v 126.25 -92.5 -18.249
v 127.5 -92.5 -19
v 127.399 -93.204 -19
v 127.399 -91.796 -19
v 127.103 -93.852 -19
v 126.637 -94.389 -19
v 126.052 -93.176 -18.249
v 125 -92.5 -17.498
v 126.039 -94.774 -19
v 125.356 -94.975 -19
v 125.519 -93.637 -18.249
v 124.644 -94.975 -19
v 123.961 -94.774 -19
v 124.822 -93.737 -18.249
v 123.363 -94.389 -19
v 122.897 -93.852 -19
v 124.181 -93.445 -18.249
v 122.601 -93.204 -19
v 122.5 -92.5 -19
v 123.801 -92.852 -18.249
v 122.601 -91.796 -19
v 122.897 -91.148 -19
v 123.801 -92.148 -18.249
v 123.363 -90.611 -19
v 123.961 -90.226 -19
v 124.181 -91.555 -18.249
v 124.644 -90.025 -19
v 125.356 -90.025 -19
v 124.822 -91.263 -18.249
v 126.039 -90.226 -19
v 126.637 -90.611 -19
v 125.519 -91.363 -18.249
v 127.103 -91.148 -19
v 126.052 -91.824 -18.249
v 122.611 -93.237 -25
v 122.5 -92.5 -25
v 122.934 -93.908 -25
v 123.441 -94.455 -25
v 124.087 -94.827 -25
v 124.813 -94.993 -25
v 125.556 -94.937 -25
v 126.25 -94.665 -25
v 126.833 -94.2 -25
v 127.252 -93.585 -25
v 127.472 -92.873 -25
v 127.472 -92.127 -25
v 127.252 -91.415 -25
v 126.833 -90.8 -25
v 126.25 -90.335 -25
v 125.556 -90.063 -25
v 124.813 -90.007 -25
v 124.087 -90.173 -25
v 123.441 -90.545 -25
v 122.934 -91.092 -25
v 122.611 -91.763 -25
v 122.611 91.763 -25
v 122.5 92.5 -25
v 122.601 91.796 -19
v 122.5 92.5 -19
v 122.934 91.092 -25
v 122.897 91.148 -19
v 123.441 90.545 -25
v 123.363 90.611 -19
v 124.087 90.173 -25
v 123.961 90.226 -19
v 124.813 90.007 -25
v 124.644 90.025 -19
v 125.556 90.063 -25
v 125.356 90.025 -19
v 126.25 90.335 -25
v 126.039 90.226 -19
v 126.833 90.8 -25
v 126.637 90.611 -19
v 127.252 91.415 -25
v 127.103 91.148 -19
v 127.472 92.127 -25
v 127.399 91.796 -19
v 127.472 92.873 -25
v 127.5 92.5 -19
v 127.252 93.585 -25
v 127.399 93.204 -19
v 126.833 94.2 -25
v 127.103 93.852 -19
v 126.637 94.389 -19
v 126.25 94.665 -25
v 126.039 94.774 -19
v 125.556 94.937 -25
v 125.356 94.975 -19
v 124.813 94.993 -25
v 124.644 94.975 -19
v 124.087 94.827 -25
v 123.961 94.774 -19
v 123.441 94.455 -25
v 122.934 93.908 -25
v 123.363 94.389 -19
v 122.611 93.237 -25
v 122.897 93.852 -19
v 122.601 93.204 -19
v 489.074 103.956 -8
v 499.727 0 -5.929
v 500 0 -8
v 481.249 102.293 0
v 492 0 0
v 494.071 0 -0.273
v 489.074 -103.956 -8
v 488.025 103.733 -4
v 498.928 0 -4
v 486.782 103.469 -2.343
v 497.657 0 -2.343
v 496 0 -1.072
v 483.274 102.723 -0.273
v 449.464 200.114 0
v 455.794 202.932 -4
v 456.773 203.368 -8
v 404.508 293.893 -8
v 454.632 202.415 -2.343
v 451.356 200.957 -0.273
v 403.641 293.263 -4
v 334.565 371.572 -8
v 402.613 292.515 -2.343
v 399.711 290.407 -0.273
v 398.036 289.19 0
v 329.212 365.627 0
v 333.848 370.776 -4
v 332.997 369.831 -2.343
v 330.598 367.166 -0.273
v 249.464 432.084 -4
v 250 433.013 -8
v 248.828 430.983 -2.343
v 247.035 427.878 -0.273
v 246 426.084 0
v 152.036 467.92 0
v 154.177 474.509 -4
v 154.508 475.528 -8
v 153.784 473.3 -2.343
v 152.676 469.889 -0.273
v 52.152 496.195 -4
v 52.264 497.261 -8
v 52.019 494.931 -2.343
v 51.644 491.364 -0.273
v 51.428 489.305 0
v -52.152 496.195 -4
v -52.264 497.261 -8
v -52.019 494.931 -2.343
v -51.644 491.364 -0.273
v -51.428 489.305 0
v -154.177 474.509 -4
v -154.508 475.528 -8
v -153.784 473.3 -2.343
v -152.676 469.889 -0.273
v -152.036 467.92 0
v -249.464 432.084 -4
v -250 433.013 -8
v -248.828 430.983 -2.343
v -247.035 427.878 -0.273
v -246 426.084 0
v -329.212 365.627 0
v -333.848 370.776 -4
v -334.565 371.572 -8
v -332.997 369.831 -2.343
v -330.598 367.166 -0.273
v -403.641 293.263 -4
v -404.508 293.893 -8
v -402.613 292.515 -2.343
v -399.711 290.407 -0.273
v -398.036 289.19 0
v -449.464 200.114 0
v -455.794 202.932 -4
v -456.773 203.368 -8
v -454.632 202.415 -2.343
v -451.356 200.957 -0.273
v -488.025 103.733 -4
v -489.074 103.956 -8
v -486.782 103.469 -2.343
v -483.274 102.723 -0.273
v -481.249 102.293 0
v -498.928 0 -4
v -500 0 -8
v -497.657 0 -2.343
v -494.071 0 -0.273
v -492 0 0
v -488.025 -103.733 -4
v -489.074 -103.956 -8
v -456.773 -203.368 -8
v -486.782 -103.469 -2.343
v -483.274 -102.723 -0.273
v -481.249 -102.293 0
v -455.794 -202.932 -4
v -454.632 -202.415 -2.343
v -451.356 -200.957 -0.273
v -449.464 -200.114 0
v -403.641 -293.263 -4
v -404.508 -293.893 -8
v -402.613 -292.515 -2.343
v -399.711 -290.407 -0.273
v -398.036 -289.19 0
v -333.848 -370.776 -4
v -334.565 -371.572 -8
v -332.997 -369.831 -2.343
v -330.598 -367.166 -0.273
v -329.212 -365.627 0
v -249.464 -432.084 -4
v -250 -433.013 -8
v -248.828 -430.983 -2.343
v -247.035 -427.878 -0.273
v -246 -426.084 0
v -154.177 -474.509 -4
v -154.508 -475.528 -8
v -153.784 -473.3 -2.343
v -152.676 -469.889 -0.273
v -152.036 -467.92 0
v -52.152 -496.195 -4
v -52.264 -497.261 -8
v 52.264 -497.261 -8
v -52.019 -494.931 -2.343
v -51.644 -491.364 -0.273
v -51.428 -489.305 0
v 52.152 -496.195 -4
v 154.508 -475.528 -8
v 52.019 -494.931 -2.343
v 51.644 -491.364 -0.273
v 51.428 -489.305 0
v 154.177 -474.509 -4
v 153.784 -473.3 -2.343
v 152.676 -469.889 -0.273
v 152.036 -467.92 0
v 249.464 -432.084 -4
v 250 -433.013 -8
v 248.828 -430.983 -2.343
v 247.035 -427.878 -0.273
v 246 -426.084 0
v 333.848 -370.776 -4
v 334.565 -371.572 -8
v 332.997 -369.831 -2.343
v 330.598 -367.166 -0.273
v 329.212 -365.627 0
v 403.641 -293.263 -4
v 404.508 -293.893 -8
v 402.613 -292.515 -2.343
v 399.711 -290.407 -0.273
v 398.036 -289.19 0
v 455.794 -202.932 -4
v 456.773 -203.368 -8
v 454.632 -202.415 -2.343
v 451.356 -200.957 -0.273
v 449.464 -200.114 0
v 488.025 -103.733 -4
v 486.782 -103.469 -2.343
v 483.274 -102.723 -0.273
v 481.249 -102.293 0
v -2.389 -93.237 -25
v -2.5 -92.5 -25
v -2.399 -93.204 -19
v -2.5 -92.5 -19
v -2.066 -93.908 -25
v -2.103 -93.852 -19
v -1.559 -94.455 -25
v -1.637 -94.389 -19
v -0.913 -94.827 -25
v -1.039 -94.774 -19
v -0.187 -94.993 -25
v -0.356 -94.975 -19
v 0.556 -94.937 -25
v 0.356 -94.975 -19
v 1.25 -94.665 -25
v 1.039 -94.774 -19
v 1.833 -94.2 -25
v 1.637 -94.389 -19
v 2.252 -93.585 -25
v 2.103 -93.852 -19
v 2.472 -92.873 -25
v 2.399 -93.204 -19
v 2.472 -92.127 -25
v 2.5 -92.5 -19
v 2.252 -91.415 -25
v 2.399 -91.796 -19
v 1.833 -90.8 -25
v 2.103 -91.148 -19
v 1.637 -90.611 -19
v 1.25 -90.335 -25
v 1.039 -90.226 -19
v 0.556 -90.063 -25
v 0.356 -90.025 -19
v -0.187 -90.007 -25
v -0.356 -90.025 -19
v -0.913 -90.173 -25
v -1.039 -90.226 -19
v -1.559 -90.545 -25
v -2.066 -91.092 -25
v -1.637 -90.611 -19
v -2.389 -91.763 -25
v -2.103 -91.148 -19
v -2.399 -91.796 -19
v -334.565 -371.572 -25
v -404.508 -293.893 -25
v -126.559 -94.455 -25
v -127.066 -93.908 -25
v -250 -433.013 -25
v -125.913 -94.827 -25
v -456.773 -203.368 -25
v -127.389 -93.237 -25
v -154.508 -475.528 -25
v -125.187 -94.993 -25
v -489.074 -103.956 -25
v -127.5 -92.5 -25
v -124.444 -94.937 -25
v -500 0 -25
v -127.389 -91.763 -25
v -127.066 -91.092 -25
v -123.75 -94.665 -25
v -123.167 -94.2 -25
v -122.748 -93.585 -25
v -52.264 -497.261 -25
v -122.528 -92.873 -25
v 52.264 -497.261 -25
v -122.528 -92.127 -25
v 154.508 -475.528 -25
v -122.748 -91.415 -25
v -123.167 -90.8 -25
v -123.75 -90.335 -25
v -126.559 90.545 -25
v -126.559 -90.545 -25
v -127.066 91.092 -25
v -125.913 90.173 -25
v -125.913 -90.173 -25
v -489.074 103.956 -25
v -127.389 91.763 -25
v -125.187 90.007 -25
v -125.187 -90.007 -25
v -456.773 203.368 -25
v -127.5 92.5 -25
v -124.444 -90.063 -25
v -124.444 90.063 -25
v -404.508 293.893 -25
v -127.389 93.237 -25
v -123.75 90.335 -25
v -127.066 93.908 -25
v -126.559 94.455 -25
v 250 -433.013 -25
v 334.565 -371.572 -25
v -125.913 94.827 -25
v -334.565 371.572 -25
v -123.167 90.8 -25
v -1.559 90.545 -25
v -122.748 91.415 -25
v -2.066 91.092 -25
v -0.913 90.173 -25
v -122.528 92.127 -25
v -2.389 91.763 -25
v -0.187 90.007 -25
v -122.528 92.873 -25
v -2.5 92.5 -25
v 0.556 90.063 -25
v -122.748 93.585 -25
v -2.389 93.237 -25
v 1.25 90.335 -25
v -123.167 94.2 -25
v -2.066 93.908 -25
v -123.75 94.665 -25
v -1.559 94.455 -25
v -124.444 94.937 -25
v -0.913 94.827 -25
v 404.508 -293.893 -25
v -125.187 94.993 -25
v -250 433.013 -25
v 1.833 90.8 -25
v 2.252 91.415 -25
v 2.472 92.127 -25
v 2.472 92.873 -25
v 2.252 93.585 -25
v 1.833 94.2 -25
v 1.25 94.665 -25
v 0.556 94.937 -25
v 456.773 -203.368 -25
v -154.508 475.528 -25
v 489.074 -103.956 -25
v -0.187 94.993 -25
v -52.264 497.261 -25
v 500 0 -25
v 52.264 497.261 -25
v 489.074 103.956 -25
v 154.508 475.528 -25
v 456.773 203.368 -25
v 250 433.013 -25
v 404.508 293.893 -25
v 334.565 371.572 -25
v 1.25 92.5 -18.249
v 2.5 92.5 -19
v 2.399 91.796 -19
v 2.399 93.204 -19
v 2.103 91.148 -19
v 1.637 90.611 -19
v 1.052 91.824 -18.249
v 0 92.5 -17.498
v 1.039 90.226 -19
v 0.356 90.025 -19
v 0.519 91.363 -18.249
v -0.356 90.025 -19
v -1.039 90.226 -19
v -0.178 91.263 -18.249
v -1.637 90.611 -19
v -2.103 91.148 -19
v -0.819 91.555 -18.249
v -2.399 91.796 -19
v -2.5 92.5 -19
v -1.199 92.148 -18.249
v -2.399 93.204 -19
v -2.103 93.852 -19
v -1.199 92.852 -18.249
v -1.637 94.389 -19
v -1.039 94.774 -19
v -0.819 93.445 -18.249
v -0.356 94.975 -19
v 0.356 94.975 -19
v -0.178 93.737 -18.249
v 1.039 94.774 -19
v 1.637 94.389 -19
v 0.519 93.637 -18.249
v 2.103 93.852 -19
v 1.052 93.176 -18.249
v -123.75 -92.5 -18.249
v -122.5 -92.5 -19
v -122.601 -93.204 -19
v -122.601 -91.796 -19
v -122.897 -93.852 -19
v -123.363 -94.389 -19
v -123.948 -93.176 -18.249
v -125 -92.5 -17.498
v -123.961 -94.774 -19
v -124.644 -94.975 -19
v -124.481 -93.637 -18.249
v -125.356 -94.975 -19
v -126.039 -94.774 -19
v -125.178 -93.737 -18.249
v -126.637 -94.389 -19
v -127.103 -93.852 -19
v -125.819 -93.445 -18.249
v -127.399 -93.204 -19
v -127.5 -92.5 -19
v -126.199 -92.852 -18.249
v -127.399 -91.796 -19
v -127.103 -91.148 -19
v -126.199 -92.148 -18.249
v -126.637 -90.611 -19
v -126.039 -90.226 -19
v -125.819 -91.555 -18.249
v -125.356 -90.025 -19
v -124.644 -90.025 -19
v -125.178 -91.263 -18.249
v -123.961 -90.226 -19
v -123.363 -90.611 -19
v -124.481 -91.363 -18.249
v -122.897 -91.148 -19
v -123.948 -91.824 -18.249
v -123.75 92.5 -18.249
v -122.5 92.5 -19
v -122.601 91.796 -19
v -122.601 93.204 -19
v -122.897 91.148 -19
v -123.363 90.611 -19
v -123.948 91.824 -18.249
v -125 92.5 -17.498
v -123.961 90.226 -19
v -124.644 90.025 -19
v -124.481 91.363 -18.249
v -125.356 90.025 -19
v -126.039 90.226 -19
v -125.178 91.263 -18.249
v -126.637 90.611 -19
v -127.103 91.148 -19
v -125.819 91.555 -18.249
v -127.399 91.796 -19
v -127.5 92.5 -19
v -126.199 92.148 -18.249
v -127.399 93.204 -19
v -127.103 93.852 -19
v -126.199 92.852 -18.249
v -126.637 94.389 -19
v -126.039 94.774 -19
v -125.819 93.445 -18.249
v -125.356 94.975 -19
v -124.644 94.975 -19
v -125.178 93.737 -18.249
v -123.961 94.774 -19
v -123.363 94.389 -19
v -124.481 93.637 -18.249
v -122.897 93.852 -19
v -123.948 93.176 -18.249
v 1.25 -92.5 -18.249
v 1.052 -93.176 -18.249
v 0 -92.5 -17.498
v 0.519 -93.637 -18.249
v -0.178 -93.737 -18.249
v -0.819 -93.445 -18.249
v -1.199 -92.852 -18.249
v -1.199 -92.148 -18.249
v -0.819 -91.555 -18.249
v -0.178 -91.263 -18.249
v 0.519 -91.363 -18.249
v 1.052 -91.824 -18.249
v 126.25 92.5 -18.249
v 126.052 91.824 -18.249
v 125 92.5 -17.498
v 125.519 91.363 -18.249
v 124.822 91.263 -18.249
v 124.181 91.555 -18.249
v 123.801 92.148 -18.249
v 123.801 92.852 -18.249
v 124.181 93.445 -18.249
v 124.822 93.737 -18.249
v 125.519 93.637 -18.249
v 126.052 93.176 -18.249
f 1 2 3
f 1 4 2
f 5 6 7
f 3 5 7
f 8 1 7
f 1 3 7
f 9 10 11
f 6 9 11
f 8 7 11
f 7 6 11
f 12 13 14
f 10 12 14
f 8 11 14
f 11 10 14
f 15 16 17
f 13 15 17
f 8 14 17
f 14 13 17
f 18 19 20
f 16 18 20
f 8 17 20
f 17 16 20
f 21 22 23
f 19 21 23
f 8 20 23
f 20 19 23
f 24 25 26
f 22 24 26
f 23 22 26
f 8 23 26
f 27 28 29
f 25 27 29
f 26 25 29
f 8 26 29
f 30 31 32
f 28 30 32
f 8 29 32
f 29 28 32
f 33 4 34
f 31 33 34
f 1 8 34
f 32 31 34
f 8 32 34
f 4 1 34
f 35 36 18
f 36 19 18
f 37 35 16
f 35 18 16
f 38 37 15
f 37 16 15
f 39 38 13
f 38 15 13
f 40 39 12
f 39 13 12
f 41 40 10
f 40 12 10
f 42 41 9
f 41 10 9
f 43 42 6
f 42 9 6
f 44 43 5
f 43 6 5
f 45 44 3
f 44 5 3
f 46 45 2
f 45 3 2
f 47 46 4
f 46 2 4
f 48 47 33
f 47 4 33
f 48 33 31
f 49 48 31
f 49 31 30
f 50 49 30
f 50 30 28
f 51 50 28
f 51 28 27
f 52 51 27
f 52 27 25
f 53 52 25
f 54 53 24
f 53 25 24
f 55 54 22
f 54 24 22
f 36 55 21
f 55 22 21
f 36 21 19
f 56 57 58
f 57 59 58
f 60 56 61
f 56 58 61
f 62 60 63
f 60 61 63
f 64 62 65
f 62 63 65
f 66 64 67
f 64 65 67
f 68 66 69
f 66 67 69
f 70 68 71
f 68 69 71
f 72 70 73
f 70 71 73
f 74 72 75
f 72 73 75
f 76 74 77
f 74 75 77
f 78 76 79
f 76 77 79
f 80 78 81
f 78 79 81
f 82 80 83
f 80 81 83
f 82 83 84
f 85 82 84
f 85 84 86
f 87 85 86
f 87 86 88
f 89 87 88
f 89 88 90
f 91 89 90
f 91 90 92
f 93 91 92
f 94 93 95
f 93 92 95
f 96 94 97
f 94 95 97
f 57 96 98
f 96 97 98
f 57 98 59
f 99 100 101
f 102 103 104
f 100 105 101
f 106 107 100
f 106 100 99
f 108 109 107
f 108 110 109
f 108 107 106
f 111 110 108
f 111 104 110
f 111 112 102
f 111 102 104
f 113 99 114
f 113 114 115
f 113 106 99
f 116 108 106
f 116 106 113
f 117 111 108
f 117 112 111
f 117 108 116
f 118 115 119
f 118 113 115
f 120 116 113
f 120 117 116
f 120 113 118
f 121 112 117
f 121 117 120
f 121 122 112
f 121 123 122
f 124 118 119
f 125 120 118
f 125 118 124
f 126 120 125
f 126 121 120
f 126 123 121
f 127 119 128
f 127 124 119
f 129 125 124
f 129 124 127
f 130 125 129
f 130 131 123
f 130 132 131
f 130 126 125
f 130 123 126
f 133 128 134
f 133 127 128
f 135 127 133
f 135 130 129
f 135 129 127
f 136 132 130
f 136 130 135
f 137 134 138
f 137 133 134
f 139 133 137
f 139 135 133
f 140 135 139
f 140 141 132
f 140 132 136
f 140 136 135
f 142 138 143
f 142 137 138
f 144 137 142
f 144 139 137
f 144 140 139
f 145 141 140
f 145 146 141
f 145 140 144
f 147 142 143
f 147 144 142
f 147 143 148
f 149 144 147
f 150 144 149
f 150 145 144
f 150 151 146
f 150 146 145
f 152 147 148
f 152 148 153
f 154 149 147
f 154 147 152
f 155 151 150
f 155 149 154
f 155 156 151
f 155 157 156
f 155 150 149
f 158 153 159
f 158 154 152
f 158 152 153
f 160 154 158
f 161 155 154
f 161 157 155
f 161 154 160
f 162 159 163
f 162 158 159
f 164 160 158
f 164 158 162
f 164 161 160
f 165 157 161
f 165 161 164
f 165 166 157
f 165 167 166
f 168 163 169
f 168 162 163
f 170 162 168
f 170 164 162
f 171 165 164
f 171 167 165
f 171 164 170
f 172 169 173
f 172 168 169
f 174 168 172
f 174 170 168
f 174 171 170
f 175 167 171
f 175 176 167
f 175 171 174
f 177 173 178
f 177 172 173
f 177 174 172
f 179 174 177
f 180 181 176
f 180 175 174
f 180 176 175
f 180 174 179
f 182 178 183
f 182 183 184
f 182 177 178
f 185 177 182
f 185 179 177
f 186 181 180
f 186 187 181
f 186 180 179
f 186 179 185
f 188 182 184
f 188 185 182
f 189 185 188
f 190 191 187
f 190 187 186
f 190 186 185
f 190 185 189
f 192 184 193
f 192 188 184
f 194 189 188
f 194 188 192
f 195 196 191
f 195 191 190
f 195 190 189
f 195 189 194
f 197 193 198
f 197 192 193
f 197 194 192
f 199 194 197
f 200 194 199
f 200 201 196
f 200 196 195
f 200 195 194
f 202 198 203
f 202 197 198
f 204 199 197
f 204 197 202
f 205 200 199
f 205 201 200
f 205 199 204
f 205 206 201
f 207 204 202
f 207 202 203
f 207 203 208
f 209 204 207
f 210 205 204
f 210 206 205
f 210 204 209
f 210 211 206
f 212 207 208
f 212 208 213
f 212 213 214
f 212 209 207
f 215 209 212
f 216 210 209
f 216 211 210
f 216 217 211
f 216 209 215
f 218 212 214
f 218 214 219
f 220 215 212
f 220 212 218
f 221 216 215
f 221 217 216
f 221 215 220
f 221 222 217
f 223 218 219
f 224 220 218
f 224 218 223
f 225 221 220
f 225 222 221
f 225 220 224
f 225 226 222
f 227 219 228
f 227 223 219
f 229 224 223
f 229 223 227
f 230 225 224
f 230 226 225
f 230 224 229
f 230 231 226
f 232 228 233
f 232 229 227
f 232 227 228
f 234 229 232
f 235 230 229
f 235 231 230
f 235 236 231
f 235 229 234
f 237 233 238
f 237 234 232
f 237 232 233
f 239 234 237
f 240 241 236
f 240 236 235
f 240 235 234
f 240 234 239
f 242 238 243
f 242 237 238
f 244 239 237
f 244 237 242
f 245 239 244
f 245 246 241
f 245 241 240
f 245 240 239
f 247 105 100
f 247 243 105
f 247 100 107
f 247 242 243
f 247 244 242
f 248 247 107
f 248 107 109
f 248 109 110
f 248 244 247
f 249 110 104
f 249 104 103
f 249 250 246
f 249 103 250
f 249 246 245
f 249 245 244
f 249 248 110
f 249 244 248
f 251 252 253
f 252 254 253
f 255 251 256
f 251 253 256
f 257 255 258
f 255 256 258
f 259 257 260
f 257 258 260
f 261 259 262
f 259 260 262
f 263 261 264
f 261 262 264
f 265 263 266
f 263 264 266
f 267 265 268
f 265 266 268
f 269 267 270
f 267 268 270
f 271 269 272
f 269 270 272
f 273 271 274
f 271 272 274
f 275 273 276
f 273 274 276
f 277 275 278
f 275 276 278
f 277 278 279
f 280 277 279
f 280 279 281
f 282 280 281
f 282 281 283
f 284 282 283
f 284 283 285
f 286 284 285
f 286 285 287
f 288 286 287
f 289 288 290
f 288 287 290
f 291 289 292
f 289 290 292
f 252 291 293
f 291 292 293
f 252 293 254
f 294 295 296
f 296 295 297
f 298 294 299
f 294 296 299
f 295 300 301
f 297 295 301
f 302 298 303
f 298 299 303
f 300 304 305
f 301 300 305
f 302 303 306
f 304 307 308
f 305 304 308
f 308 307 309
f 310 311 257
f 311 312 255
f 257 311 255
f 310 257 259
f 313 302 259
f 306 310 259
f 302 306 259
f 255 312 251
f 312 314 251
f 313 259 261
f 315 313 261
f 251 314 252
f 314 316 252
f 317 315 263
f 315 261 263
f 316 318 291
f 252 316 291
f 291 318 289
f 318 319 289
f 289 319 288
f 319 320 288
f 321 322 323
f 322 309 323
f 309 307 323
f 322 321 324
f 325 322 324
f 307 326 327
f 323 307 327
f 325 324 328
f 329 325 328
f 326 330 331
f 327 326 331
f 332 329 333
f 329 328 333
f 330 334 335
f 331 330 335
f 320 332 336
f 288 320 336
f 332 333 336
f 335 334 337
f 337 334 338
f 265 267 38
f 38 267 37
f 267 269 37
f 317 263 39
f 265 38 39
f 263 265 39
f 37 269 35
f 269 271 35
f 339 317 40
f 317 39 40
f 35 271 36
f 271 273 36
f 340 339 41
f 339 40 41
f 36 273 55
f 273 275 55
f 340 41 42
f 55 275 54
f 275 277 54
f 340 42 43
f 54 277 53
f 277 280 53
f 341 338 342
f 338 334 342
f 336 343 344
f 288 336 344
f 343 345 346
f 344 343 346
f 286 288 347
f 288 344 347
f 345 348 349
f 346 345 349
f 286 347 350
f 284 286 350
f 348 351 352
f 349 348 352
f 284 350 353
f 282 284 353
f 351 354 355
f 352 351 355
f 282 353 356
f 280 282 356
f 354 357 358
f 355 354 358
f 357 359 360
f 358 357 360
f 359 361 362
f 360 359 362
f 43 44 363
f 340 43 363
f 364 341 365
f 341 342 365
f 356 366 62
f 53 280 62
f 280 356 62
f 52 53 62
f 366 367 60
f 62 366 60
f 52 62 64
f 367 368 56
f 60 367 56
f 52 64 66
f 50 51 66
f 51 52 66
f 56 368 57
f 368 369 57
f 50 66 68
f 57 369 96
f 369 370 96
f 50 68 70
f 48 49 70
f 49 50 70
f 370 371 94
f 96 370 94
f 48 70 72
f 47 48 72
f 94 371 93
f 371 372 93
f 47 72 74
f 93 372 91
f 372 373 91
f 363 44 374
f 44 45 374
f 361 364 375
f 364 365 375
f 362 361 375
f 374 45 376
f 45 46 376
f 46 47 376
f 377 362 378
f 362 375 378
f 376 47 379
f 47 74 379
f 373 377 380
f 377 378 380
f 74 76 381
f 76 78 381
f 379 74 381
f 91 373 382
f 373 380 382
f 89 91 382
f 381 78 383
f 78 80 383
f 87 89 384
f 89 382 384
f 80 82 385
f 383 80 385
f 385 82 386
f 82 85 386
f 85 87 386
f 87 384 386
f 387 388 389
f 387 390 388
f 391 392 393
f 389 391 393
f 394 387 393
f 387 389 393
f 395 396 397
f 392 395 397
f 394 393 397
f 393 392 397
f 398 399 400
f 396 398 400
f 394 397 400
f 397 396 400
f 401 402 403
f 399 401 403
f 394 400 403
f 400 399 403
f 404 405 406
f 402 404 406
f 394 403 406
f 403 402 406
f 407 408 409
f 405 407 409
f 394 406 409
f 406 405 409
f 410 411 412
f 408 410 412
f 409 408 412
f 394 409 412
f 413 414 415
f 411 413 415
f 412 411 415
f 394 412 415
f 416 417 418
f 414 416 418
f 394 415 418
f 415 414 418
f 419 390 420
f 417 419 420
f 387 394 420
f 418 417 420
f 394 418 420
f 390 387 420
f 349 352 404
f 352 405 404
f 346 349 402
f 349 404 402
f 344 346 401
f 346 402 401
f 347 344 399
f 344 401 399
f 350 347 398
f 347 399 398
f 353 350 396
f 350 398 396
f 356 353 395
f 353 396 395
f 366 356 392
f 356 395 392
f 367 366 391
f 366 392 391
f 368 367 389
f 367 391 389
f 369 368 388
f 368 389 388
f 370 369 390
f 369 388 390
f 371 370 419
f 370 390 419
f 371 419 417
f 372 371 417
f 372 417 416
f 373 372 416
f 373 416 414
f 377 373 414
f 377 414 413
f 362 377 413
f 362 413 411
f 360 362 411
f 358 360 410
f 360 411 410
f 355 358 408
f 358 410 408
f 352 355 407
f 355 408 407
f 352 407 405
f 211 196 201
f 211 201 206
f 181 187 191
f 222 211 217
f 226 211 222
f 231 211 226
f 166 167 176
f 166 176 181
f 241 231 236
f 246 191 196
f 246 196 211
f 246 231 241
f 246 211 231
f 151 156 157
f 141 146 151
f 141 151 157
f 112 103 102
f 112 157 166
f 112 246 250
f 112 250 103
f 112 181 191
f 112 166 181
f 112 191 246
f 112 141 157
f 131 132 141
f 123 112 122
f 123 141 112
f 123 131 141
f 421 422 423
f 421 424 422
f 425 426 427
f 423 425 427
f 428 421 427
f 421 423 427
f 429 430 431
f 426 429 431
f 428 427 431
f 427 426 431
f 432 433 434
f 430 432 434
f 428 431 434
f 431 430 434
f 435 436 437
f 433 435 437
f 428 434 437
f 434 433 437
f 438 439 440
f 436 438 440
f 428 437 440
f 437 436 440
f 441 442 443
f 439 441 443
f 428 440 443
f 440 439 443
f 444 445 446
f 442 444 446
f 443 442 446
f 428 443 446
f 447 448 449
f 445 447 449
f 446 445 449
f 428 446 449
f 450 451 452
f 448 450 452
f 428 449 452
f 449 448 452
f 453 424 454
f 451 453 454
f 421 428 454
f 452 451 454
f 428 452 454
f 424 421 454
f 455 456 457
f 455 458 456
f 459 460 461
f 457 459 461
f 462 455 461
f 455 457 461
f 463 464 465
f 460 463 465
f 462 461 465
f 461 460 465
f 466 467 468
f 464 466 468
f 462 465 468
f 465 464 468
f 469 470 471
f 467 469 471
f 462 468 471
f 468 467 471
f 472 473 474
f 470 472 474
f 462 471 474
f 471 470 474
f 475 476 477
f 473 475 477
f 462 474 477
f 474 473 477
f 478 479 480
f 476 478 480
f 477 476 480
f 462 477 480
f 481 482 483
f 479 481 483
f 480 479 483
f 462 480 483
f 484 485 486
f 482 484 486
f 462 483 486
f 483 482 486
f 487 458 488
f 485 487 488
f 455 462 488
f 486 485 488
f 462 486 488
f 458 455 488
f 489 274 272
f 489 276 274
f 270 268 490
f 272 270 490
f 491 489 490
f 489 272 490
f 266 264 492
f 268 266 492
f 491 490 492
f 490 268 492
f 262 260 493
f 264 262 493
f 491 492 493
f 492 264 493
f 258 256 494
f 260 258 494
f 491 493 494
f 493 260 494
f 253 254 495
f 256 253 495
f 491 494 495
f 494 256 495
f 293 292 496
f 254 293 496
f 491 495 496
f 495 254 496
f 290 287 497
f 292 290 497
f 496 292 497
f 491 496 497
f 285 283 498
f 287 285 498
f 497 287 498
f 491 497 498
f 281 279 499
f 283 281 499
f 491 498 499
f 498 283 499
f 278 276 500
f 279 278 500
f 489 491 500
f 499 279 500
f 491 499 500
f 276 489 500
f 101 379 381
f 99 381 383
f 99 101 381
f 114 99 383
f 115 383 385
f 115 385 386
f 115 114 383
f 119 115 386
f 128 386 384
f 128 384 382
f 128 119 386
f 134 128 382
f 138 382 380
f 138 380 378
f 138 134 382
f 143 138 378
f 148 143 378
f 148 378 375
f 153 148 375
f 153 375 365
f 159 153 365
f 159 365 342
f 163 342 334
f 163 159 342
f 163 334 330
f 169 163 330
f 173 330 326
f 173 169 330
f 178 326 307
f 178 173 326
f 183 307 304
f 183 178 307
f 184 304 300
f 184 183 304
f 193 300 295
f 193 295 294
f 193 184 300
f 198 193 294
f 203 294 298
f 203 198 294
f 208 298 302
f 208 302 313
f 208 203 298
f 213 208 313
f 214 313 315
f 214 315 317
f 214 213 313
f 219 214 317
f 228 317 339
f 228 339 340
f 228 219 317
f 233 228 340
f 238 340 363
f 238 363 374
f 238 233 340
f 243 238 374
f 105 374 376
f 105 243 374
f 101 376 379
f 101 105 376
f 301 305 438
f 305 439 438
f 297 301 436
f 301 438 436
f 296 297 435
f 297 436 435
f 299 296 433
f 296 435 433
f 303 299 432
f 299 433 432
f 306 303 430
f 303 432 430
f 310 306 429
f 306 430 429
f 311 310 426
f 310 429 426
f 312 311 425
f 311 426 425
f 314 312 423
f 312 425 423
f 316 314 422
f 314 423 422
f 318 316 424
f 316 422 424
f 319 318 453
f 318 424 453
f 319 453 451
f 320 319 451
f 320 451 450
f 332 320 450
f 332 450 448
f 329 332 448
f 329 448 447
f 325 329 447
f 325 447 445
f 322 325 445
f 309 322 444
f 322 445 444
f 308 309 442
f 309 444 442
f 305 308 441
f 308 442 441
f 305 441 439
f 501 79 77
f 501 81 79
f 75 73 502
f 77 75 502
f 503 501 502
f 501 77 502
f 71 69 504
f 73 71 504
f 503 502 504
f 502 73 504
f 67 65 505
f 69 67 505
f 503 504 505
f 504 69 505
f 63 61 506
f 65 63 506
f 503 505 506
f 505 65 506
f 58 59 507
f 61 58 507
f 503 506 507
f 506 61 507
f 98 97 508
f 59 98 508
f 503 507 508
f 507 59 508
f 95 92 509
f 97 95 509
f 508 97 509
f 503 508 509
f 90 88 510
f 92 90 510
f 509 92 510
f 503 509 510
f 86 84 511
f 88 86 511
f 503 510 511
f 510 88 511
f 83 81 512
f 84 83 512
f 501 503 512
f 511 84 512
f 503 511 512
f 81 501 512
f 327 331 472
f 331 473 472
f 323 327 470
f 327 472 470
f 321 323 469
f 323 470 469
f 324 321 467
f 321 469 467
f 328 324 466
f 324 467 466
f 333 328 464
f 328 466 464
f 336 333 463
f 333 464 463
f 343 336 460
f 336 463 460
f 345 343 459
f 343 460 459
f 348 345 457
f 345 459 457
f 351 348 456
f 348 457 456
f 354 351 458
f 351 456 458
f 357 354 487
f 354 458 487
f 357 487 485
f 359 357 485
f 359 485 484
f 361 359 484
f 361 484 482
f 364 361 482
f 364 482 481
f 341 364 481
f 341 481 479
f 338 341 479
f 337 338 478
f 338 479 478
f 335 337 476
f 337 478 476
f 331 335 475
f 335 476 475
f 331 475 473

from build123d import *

# Parameters (mm, degrees)
F0_R     = 500
F1_DEPTH = 25
F2_R     = 8
F4_D     = 5
F4_DEPTH = 6
F4_TIP   = 1.5021515476


with BuildPart() as f1:
    # F0 (on Top) → F1 (new body)
    with BuildSketch(Plane.XY):
        Circle(F0_R)
    extrude(amount=-F1_DEPTH)

    # F2
    f2_edges = [f1.edges().sort_by_distance(p)[0] for p in [
        (-500, 0, 0),
    ]]
    fillet(f2_edges, radius=F2_R)

    # F4
    with Locations(Plane(origin=(0, 0, -25), x_dir=(1, 0, 0), z_dir=(0, 0, -1))):
        with Locations((-125, 92.5), (0, -92.5), (125, -92.5), (125, 92.5), (-125, -92.5), (0, 92.5)):
            Hole(F4_D / 2, depth=F4_DEPTH)
            with Locations((0, 0, -(F4_DEPTH + F4_TIP / 2))):  # 118° drill point
                Cone(0, F4_D / 2, F4_TIP, mode=Mode.SUBTRACT)


solid = f1.part
